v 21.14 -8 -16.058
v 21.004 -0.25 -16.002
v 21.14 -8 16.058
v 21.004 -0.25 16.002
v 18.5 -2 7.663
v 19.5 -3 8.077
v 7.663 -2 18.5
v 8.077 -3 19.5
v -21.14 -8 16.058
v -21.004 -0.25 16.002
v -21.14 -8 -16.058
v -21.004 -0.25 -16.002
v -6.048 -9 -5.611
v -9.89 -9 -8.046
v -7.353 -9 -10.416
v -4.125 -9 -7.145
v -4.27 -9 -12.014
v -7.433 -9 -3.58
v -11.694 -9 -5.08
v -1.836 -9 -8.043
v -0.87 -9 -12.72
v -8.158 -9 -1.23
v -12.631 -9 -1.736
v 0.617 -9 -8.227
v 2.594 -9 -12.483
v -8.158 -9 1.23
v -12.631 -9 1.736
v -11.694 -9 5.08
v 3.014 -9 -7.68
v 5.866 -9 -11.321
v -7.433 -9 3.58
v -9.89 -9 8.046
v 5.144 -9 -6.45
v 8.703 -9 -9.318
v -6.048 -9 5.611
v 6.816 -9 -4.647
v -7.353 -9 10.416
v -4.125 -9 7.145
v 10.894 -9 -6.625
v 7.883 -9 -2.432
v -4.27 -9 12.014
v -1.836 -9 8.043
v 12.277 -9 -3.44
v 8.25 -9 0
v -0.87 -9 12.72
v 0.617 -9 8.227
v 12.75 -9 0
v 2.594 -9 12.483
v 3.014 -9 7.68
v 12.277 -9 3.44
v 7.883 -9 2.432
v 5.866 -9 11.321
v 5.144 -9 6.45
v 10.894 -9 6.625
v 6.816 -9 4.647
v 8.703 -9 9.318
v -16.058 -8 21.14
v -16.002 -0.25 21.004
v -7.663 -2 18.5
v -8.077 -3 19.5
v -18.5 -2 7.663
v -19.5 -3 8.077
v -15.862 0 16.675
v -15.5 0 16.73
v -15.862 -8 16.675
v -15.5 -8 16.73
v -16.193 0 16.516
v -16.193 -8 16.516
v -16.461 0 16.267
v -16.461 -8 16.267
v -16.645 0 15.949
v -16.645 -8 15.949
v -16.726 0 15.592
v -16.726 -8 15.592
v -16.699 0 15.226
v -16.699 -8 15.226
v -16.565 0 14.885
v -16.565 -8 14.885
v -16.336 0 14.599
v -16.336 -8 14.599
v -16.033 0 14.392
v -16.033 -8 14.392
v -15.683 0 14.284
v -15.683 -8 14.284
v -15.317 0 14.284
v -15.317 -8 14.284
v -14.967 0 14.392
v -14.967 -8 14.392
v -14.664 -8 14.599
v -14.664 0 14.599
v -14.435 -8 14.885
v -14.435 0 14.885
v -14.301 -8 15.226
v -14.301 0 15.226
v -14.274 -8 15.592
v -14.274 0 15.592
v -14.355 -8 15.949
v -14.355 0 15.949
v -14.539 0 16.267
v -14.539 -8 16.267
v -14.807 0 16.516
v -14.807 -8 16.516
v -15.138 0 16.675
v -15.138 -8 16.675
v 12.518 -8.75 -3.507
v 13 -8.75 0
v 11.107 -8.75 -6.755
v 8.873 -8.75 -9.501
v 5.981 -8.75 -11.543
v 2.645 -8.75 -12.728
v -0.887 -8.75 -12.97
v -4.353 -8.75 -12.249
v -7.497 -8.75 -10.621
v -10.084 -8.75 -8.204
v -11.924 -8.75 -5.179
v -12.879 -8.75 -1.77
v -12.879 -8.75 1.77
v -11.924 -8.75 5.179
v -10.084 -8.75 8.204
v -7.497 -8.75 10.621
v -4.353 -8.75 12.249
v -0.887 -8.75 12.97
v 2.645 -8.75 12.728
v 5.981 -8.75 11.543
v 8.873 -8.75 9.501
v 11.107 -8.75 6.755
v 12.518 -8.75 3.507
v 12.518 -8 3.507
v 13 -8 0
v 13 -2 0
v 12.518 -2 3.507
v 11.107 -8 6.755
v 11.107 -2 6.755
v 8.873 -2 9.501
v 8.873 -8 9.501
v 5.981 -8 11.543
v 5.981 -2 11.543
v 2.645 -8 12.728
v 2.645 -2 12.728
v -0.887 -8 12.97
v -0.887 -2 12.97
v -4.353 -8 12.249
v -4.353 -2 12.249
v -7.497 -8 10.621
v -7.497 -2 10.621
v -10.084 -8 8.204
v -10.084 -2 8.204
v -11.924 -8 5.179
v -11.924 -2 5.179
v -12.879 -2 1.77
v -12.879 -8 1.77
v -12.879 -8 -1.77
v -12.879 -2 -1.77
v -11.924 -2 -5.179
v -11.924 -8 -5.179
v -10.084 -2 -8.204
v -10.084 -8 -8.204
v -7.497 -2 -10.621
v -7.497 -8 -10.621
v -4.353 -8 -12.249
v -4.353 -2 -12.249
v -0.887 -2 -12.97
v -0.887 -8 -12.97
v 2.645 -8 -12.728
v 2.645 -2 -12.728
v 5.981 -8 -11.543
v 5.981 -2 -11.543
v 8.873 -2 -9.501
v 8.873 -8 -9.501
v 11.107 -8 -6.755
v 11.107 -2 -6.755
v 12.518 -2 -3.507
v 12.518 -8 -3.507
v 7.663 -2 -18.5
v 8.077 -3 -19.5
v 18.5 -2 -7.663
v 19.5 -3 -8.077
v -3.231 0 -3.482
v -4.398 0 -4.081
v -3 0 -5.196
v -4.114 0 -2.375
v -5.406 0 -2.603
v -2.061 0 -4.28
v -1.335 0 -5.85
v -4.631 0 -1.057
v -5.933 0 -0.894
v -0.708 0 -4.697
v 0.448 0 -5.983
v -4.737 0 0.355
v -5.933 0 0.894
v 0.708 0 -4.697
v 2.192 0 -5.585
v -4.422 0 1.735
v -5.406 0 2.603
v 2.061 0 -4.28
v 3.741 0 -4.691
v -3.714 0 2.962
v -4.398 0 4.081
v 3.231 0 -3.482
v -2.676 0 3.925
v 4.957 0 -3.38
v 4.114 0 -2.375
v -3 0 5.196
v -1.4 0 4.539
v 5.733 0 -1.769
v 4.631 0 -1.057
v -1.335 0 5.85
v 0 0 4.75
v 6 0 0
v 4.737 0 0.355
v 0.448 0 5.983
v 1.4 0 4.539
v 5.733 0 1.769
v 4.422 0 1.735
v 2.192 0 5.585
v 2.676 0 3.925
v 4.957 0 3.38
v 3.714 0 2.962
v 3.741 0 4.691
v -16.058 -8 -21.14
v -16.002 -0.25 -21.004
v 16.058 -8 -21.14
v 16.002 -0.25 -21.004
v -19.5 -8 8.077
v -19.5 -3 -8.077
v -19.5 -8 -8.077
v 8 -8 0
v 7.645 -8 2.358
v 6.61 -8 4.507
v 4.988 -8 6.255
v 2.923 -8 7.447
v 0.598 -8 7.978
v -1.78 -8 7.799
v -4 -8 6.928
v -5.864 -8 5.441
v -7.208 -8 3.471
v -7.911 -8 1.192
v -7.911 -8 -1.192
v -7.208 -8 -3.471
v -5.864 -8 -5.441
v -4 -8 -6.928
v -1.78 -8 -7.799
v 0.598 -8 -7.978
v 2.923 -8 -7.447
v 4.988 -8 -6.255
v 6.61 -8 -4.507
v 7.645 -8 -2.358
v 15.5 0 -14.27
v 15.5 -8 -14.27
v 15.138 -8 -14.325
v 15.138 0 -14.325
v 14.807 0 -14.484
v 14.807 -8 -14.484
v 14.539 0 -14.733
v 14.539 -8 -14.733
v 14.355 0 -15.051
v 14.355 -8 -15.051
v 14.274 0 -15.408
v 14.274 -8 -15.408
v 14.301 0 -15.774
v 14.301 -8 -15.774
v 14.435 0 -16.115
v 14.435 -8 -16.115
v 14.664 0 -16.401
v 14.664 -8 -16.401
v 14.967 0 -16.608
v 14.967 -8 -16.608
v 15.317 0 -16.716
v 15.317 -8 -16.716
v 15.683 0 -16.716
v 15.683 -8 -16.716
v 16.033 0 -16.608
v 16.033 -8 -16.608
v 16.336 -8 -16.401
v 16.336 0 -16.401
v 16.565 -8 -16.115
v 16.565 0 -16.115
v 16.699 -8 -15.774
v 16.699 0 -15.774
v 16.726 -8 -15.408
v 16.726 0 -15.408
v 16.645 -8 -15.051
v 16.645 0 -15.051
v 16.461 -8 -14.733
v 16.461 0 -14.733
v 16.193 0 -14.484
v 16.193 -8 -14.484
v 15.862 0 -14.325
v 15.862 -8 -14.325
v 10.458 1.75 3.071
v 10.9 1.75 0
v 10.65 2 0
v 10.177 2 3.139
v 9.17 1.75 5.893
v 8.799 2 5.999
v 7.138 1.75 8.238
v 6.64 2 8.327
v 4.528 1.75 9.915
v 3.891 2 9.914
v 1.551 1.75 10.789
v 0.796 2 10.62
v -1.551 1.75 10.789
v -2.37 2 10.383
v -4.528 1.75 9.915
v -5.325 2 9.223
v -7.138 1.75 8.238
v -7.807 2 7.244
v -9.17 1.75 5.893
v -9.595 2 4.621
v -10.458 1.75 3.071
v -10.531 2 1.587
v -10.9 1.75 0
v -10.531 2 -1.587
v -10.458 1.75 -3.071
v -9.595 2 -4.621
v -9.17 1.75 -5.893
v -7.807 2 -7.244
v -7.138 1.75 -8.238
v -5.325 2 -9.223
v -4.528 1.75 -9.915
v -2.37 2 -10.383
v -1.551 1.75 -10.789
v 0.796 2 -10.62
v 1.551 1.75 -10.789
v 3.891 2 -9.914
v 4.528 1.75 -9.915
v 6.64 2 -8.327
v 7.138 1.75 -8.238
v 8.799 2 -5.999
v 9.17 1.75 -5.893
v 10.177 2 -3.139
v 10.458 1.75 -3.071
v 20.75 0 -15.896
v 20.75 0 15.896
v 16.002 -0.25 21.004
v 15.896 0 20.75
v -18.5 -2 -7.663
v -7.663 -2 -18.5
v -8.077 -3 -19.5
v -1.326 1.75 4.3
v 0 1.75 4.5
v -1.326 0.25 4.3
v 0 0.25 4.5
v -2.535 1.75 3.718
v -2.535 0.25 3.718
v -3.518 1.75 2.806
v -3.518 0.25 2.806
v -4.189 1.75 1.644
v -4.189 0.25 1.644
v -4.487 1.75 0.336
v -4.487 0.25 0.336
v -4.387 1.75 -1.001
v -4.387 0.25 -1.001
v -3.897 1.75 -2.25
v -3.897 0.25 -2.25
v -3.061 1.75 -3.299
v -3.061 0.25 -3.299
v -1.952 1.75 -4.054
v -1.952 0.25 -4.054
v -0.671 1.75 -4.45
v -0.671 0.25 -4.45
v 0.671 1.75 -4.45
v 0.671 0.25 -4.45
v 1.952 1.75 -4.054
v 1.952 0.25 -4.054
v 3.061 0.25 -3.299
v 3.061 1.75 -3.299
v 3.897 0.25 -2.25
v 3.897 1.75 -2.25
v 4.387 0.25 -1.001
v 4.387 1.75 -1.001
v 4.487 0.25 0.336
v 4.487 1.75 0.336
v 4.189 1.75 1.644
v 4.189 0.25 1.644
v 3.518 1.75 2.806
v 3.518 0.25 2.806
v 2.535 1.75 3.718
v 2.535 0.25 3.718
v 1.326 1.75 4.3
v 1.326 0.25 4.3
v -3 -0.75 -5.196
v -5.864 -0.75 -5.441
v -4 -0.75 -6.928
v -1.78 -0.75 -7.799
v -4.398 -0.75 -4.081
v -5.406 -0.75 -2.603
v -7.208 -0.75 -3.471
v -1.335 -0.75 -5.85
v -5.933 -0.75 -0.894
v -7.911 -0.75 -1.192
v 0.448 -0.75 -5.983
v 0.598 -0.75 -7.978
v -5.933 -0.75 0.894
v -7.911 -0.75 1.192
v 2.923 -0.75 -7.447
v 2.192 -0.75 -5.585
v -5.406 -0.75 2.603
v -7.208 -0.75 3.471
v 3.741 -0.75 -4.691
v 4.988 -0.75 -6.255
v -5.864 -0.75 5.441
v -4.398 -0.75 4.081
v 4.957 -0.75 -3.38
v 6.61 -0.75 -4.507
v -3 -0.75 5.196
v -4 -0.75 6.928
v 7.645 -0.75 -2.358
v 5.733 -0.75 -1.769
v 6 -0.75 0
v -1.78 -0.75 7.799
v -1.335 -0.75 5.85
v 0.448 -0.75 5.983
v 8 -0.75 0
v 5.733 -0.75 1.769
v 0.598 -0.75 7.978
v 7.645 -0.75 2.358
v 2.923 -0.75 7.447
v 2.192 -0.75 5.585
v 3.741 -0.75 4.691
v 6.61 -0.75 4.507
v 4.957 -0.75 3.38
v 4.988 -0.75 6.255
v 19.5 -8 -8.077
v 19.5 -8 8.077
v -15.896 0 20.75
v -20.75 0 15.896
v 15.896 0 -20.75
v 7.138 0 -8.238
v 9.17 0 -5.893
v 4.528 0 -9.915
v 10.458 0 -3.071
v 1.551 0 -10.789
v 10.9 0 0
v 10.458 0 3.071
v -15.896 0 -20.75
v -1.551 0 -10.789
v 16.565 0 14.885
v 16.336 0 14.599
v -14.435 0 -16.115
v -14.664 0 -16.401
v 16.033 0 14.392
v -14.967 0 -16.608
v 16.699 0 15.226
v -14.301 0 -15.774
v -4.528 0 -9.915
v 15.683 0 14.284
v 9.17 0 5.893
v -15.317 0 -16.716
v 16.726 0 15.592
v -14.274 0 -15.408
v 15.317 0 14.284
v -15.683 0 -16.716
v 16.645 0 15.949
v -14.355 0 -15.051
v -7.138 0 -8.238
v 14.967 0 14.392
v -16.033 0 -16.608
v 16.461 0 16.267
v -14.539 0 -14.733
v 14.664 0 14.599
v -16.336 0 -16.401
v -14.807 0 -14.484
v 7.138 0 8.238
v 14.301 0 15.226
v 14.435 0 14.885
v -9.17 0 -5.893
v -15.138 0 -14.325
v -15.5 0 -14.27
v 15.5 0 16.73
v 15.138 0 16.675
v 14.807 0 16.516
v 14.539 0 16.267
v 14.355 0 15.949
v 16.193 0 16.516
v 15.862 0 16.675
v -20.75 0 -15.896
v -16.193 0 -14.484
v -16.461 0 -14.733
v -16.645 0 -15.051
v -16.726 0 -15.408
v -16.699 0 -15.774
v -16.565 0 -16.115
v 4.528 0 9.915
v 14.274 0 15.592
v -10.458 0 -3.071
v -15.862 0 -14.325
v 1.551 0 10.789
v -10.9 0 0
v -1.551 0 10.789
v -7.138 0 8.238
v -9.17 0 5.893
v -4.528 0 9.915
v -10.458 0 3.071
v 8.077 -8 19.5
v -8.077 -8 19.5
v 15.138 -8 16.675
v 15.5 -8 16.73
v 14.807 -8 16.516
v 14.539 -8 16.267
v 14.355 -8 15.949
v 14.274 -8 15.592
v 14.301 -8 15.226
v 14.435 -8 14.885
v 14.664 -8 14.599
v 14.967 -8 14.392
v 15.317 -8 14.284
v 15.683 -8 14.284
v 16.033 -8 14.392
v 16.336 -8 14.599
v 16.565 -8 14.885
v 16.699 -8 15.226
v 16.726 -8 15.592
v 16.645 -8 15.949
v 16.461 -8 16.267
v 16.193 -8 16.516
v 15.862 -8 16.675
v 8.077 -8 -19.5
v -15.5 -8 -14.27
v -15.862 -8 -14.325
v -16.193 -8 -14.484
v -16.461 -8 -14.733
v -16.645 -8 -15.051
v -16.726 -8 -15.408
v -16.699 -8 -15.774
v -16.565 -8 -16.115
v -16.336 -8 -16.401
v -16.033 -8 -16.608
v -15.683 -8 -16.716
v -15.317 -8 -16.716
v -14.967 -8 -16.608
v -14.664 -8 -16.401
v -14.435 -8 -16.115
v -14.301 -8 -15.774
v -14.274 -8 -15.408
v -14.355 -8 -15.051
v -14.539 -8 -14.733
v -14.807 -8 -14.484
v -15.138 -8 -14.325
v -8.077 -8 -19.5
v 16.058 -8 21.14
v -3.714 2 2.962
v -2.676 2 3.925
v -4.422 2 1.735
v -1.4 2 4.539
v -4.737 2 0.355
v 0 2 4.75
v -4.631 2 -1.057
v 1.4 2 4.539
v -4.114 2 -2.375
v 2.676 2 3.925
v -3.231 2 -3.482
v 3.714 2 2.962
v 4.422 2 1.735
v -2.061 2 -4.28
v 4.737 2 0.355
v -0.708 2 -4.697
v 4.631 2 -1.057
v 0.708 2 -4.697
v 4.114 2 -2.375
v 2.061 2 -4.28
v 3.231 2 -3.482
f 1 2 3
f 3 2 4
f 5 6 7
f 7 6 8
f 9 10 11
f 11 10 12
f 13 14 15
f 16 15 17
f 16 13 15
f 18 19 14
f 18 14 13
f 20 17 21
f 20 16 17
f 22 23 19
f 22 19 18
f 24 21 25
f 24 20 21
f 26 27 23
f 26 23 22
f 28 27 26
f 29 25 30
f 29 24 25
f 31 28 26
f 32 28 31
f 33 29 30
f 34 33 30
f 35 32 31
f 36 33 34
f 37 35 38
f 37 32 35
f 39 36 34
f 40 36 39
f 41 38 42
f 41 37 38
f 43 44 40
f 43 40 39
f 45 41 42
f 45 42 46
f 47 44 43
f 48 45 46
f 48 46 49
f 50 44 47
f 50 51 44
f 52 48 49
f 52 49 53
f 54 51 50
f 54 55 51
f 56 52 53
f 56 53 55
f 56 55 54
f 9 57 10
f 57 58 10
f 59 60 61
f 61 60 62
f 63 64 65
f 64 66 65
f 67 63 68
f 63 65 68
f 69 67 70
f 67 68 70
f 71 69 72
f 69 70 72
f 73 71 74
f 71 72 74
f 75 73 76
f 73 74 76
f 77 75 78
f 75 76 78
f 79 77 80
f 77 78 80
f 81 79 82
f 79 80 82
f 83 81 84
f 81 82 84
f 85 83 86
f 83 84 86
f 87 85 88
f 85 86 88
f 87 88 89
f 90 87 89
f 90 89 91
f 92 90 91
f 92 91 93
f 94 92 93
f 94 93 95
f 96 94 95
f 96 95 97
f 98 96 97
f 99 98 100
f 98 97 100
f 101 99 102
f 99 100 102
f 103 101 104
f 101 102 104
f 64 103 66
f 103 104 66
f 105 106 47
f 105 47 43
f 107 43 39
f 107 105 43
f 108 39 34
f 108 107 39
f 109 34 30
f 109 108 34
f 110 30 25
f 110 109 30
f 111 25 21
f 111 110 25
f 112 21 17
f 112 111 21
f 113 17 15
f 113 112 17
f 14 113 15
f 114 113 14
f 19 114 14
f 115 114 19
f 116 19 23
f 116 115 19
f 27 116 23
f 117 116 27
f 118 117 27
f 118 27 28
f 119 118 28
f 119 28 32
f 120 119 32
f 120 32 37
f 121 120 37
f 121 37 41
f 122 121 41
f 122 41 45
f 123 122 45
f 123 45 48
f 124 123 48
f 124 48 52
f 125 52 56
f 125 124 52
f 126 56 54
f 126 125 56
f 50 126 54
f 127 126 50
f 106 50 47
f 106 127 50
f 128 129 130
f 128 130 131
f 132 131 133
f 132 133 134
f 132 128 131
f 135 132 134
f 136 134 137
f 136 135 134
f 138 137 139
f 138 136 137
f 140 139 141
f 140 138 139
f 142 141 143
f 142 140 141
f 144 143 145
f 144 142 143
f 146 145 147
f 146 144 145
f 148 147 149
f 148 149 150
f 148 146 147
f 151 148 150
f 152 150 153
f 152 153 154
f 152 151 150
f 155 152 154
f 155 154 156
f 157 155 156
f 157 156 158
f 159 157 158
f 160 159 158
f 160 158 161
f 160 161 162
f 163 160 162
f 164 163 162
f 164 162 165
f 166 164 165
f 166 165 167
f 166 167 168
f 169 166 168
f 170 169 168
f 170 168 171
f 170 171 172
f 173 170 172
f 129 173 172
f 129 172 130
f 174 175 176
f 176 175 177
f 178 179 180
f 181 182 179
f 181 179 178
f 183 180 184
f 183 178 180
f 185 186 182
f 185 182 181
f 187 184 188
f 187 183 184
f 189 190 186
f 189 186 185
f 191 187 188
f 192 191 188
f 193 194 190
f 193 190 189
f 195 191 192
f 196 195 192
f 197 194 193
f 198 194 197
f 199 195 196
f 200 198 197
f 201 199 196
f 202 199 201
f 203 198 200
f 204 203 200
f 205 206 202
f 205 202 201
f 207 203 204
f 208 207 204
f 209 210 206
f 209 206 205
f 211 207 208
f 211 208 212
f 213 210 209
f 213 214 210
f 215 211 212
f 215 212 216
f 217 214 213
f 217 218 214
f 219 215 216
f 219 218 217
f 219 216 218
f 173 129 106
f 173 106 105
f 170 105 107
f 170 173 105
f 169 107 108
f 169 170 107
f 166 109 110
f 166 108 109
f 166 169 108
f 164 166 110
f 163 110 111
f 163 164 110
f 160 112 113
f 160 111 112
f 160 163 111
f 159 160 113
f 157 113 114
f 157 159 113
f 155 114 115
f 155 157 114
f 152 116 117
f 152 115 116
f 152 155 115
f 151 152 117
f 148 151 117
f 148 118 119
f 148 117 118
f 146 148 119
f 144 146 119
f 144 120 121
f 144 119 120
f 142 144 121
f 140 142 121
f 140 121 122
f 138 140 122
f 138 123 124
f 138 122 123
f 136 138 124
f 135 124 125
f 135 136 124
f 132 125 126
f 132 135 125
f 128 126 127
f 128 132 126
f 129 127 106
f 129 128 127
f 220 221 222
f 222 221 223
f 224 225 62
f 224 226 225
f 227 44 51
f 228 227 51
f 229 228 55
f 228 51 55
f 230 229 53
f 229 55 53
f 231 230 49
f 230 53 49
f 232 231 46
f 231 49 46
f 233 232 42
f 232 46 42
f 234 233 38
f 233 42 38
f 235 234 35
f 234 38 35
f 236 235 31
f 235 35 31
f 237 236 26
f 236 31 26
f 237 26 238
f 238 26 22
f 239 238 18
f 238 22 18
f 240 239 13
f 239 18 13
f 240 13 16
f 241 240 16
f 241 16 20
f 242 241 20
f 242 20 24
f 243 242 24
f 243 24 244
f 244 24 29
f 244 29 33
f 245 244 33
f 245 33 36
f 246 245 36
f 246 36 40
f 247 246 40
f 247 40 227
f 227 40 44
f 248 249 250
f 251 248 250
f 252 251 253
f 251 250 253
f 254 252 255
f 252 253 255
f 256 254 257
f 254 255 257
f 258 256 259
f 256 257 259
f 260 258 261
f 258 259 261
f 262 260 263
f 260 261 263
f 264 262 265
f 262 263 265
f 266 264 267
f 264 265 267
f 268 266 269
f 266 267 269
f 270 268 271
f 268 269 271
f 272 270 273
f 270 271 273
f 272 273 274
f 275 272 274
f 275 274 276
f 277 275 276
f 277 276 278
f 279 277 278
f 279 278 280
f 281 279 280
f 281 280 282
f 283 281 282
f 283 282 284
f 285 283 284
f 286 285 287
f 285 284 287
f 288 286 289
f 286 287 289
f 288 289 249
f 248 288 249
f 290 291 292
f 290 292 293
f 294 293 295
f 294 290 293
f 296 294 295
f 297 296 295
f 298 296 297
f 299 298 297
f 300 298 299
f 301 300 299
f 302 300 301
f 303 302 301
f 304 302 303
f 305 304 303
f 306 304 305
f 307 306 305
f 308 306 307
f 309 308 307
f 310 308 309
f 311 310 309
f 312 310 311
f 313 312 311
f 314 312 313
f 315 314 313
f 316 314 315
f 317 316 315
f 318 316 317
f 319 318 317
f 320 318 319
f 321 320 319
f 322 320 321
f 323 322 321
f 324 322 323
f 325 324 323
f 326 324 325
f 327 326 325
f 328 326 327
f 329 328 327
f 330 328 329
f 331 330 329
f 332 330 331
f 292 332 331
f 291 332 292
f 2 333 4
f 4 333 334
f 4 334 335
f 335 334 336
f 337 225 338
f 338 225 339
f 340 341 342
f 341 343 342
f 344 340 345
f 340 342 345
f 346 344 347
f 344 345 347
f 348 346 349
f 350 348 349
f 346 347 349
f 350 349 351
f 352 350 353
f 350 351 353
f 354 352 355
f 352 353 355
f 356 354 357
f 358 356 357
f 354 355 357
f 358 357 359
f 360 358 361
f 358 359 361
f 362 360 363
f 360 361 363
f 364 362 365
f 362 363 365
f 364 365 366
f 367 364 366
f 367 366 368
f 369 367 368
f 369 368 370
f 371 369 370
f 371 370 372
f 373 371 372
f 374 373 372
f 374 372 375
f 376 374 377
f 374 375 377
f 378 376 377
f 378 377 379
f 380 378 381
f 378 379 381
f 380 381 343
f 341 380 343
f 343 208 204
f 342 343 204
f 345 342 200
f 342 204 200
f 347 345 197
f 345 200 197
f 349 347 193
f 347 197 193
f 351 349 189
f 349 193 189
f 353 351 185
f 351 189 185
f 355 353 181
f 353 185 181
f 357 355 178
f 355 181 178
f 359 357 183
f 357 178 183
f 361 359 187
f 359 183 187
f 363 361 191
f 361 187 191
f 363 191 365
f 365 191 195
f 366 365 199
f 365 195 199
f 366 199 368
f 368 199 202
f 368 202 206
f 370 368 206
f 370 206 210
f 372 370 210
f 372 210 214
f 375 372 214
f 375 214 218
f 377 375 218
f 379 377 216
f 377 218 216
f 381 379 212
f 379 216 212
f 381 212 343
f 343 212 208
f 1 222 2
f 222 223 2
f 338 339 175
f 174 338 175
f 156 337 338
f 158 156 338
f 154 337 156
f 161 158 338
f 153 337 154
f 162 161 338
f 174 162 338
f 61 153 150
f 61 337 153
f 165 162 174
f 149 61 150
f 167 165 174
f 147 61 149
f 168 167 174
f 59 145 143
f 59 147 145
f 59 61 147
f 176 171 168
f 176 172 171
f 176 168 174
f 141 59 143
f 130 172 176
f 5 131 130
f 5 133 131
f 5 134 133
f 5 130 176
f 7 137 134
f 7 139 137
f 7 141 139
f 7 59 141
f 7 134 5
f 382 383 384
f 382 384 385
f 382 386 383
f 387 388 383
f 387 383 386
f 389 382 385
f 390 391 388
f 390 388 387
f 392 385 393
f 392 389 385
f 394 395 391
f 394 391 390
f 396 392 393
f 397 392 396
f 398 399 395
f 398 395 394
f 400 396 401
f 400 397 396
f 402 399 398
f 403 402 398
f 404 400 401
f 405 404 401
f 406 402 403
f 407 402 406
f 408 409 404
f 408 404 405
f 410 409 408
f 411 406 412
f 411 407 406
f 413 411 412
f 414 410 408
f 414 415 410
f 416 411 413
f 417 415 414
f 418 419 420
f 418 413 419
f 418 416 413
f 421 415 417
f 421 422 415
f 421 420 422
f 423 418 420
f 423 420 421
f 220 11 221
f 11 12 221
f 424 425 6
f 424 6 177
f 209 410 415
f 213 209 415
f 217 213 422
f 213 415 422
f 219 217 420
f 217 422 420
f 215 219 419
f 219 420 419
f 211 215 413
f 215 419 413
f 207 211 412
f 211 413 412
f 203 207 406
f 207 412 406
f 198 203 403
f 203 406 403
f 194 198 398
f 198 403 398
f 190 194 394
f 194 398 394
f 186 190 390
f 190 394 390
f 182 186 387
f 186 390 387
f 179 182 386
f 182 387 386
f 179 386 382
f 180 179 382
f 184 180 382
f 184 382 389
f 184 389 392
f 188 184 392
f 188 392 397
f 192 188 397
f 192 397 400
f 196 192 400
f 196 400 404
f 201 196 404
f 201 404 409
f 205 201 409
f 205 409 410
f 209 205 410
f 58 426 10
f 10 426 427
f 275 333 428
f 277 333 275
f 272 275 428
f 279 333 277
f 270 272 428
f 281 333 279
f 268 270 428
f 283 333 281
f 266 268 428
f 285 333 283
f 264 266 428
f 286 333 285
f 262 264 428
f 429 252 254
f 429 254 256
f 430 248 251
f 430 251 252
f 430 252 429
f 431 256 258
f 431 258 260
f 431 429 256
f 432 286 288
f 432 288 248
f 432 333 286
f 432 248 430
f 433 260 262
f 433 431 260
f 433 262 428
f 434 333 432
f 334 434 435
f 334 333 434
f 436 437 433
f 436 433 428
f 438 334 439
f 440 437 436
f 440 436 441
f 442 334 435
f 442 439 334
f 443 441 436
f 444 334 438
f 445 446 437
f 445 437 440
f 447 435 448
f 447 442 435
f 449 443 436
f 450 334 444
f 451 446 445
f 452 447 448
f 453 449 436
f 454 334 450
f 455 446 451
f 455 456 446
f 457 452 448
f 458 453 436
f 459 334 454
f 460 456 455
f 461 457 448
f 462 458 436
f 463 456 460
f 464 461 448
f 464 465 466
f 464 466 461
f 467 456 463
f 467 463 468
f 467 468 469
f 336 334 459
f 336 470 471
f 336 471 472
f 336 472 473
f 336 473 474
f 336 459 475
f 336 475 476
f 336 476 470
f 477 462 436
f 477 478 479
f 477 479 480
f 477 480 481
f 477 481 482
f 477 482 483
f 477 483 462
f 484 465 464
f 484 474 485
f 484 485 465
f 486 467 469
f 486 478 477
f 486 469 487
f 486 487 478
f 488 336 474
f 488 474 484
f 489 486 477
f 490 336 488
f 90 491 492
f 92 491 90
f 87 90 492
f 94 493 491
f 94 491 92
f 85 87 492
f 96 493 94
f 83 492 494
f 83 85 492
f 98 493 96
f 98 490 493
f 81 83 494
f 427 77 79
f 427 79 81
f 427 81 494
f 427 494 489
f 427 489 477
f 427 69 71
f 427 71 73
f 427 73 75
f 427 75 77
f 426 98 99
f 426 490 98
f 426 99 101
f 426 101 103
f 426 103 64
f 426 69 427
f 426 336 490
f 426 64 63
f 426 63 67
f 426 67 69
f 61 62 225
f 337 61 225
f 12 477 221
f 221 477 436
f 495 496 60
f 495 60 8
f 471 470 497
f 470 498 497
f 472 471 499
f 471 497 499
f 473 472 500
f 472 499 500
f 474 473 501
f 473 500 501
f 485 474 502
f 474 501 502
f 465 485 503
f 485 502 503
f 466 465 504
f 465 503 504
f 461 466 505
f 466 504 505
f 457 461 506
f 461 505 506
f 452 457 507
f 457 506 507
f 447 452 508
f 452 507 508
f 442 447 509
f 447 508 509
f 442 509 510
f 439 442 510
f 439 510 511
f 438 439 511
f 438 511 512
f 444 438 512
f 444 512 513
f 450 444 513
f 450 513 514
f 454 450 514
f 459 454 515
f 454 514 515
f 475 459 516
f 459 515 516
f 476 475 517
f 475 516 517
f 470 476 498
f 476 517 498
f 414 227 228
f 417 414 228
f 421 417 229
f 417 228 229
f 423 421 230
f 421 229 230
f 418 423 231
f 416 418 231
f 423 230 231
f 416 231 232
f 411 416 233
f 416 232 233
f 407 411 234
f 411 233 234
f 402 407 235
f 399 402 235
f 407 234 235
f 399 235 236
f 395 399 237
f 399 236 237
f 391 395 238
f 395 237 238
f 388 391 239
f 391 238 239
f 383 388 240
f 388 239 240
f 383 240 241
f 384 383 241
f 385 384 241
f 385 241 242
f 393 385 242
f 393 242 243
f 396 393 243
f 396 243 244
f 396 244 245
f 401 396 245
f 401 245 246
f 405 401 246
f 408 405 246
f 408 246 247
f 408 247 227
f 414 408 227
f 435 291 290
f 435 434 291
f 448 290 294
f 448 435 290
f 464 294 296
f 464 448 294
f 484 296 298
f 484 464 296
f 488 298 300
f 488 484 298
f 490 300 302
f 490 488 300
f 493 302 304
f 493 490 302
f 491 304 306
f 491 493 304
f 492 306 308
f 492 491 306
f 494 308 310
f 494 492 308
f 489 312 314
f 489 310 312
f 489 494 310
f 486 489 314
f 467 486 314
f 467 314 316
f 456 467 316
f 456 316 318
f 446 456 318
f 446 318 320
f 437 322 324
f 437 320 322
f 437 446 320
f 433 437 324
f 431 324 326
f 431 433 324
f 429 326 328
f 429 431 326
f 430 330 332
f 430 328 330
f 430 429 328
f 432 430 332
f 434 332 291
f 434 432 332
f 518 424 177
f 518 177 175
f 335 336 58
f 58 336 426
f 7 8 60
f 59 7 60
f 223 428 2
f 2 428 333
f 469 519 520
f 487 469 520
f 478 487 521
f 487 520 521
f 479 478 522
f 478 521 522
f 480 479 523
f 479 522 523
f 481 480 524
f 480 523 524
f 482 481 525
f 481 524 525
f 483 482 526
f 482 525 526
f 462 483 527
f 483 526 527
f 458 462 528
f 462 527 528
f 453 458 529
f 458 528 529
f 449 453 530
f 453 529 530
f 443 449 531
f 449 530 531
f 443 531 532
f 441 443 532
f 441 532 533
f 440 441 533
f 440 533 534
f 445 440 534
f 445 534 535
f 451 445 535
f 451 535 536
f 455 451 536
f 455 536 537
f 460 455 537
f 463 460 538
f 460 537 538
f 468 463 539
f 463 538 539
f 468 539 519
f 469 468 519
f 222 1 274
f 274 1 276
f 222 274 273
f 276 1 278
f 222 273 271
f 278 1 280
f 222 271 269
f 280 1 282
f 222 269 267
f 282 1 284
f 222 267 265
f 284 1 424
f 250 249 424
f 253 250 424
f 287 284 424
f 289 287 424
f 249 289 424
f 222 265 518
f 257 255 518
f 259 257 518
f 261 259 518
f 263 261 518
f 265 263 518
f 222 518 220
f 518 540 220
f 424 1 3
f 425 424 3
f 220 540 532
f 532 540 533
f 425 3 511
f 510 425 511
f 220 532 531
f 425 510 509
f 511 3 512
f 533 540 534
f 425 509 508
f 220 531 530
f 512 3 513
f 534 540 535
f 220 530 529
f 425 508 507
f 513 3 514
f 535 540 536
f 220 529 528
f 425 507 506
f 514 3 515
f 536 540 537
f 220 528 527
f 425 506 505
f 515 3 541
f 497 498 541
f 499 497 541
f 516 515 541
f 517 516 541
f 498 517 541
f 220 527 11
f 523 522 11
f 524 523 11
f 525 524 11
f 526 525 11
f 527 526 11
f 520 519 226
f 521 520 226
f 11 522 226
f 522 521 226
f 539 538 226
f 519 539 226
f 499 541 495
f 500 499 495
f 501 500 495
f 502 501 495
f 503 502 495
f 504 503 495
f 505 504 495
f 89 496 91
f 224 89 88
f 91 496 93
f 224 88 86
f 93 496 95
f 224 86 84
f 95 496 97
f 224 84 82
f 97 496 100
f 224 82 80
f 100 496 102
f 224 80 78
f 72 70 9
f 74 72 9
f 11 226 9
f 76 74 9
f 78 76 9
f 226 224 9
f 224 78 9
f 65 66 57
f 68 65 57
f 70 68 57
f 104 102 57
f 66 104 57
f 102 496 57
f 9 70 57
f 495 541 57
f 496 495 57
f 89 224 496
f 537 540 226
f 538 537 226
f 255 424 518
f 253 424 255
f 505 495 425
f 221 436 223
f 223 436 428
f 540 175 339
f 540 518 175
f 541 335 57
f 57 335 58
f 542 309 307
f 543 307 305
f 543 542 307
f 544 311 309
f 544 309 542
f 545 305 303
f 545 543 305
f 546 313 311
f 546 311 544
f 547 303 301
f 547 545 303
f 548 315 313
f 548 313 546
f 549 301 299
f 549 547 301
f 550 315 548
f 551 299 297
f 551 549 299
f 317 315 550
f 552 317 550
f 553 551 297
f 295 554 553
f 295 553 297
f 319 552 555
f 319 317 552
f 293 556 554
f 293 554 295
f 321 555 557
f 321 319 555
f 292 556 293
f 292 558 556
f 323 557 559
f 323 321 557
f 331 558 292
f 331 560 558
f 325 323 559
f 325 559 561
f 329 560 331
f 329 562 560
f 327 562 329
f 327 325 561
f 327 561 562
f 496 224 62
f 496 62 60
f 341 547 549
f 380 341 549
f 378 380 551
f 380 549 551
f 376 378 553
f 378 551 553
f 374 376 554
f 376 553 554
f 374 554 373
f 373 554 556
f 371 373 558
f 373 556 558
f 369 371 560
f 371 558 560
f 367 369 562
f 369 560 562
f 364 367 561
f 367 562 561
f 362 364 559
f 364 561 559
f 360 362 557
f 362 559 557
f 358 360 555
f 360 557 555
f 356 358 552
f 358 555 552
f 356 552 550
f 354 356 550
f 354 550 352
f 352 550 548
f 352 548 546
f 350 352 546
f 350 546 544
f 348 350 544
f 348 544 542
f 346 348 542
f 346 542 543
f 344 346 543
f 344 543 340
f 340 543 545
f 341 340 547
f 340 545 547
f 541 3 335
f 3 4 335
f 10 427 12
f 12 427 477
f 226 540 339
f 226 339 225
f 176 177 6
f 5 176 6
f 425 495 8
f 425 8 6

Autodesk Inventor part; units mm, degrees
ref_plane "YZ Plane" through (0, 0, 0) normal (1, 0, 0) x (0, 1, 0)
ref_plane "XZ Plane" through (0, 0, 0) normal (0, 1, 0) x (-1, 0, 0)
ref_plane "XY Plane" through (0, 0, 0) normal (0, 0, 1) x (1, 0, 0)
sketch "Sketch11" plane through (0, 0, 0) normal (0, 1, 0) x (-1, 0, 0)
  line L0 (-16, 21) -> (16, 21)
  line L1 (21, 16) -> (21, -16)
  line L2 (16, -21) -> (-16, -21)
  line L3 (-21, -16) -> (-21, 16)
  line L4 (-21, 21) -> (21, -21) construction
  line L5 (21, 21) -> (-21, -21) construction
  line L6 (21, -16) -> (16, -21)
  line L7 (-16, -21) -> (-21, -16)
  line L8 (-21, 16) -> (-16, 21)
  line L9 (16, 21) -> (21, 16)
  point P0 (0, 0)
  dimension "d82" = 42
  dimension "d83" = 5
  dimension "d84" = 5
  dimension "d85" = 5
  dimension "d86" = 5
  dimension "d87" = 5
  dimension "d88" = 5
  dimension "d89" = 5
  dimension "d90" = 5
extrude "Extrusion7" add sketch "Sketch11" against normal blind 8 draft 1
sketch "Sketch12" plane through (0, 0, 0) normal (0, 1, 0) x (1, 0, 0)
  circle A0 centre (0, 0) radius 10.9
  dimension "d93" = 21.8
extrude "Extrusion8" add sketch "Sketch12" along normal blind 2
sketch "Sketch13" plane through (0, -8, 0) normal (0, -1, 0) x (1, 0, 0)
  circle A0 centre (0, 0) radius 13
  line L0 (-8.0772, 19.5) -> (8.0772, 19.5)
  line L1 (8.0772, 19.5) -> (19.5, 8.0772)
  line L2 (19.5, 8.0772) -> (19.5, -8.0772)
  line L3 (19.5, -8.0772) -> (8.0772, -19.5)
  line L4 (8.0772, -19.5) -> (-8.0772, -19.5)
  line L5 (-8.0772, -19.5) -> (-19.5, -8.0772)
  line L6 (-19.5, -8.0772) -> (-19.5, 8.0772)
  line L7 (-19.5, 8.0772) -> (-8.0772, 19.5)
  dimension "d96" = 26
  dimension "d97" = 39
extrude "Extrusion9" cut sketch "Sketch13" against normal blind 6
sketch "Sketch14" plane through (0, -8, 0) normal (0, -1, 0) x (1, 0, 0)
  circle A0 centre (0, 0) radius 13 projected
extrude "Extrusion10" add sketch "Sketch14" along normal blind 1
sketch "Sketch15" plane through (0, -9, 0) normal (0, -1, 0) x (1, 0, 0)
  circle A0 centre (0, 0) radius 8
  dimension "d102" = 16
extrude "Extrusion11" cut sketch "Sketch15" against normal blind 8.25
sketch "Sketch16" plane through (0, 2, 0) normal (0, 1, 0) x (1, 0, 0)
  point P0 (0, 0)
  point P1 (0, 0)
hole "Hole5" at (0, 2, 0) direction (0, -1, 0) diameter 9 end through all
sketch "Sketch17" plane through (0, -0.75, 0) normal (0, -1, 0) x (1, 0, 0)
  circle A0 centre (0, 0) radius 6
  dimension "d112" = 12
extrude "Extrusion12" cut sketch "Sketch17" against normal blind 0.75
sketch "Sketch18" plane through (0, 0, 0) normal (0, 1, 0) x (1, 0, 0)
  line L0 (-15.5, 15.5) -> (15.5, 15.5) construction
  line L1 (15.5, 15.5) -> (15.5, -15.5) construction
  line L2 (15.5, -15.5) -> (-15.5, -15.5) construction
  line L3 (-15.5, -15.5) -> (-15.5, 15.5) construction
  line L4 (-15.5, 15.5) -> (15.5, -15.5) construction
  line L5 (15.5, 15.5) -> (-15.5, -15.5) construction
  point P0 (0, 0)
  point P1 (0, 0)
  dimension "d115" = 31
  dimension "d124" = 31
hole "Hole6" at (-15.5, 0, -15.5) at (15.5, 0, -15.5) at (15.5, 0, 15.5) at (-15.5, 0, 15.5) direction (0, -1, 0) diameter 2.459 end through all thread size "M3x0.5" class "6H" standard "ISO Metric profile"
chamfer "Chamfer1" distance 0.25 distance2 1 1 edges at (-8, -9, 0) measured on face at (11.1299, -9, -1.6752)
chamfer "Chamfer2" distance 0.25 angle 45 12 edges at (-13, -9, 0) (0, 0, -4.5) (0, 2, -4.5) (-10.9, 2, 0) (-21, 0, 0) (-18.5, 0, 18.5) (0, 0, 21) (18.5, 0, 18.5) (21, 0, 0) (18.5, 0, -18.5) (0, 0, -21) (-18.5, 0, -18.5)
chamfer "Chamfer3" distance 1 angle 45 8 edges at (-13.7886, -2, -13.7886) (-19.5, -2, 0) (-13.7886, -2, 13.7886) (0, -2, 19.5) (13.7886, -2, 13.7886) (19.5, -2, 0) (13.7886, -2, -13.7886) (0, -2, -19.5)
equation "\"d84\" = d83"
equation "\"d85\" = d83"
equation "\"d86\" = d85"
equation "\"d87\" = d83"
equation "\"d88\" = d87"
equation "\"d89\" = d83"
equation "\"d90\" = d89"
properties part number "Nema 17 Top Cap" material "Aluminum 6061"
